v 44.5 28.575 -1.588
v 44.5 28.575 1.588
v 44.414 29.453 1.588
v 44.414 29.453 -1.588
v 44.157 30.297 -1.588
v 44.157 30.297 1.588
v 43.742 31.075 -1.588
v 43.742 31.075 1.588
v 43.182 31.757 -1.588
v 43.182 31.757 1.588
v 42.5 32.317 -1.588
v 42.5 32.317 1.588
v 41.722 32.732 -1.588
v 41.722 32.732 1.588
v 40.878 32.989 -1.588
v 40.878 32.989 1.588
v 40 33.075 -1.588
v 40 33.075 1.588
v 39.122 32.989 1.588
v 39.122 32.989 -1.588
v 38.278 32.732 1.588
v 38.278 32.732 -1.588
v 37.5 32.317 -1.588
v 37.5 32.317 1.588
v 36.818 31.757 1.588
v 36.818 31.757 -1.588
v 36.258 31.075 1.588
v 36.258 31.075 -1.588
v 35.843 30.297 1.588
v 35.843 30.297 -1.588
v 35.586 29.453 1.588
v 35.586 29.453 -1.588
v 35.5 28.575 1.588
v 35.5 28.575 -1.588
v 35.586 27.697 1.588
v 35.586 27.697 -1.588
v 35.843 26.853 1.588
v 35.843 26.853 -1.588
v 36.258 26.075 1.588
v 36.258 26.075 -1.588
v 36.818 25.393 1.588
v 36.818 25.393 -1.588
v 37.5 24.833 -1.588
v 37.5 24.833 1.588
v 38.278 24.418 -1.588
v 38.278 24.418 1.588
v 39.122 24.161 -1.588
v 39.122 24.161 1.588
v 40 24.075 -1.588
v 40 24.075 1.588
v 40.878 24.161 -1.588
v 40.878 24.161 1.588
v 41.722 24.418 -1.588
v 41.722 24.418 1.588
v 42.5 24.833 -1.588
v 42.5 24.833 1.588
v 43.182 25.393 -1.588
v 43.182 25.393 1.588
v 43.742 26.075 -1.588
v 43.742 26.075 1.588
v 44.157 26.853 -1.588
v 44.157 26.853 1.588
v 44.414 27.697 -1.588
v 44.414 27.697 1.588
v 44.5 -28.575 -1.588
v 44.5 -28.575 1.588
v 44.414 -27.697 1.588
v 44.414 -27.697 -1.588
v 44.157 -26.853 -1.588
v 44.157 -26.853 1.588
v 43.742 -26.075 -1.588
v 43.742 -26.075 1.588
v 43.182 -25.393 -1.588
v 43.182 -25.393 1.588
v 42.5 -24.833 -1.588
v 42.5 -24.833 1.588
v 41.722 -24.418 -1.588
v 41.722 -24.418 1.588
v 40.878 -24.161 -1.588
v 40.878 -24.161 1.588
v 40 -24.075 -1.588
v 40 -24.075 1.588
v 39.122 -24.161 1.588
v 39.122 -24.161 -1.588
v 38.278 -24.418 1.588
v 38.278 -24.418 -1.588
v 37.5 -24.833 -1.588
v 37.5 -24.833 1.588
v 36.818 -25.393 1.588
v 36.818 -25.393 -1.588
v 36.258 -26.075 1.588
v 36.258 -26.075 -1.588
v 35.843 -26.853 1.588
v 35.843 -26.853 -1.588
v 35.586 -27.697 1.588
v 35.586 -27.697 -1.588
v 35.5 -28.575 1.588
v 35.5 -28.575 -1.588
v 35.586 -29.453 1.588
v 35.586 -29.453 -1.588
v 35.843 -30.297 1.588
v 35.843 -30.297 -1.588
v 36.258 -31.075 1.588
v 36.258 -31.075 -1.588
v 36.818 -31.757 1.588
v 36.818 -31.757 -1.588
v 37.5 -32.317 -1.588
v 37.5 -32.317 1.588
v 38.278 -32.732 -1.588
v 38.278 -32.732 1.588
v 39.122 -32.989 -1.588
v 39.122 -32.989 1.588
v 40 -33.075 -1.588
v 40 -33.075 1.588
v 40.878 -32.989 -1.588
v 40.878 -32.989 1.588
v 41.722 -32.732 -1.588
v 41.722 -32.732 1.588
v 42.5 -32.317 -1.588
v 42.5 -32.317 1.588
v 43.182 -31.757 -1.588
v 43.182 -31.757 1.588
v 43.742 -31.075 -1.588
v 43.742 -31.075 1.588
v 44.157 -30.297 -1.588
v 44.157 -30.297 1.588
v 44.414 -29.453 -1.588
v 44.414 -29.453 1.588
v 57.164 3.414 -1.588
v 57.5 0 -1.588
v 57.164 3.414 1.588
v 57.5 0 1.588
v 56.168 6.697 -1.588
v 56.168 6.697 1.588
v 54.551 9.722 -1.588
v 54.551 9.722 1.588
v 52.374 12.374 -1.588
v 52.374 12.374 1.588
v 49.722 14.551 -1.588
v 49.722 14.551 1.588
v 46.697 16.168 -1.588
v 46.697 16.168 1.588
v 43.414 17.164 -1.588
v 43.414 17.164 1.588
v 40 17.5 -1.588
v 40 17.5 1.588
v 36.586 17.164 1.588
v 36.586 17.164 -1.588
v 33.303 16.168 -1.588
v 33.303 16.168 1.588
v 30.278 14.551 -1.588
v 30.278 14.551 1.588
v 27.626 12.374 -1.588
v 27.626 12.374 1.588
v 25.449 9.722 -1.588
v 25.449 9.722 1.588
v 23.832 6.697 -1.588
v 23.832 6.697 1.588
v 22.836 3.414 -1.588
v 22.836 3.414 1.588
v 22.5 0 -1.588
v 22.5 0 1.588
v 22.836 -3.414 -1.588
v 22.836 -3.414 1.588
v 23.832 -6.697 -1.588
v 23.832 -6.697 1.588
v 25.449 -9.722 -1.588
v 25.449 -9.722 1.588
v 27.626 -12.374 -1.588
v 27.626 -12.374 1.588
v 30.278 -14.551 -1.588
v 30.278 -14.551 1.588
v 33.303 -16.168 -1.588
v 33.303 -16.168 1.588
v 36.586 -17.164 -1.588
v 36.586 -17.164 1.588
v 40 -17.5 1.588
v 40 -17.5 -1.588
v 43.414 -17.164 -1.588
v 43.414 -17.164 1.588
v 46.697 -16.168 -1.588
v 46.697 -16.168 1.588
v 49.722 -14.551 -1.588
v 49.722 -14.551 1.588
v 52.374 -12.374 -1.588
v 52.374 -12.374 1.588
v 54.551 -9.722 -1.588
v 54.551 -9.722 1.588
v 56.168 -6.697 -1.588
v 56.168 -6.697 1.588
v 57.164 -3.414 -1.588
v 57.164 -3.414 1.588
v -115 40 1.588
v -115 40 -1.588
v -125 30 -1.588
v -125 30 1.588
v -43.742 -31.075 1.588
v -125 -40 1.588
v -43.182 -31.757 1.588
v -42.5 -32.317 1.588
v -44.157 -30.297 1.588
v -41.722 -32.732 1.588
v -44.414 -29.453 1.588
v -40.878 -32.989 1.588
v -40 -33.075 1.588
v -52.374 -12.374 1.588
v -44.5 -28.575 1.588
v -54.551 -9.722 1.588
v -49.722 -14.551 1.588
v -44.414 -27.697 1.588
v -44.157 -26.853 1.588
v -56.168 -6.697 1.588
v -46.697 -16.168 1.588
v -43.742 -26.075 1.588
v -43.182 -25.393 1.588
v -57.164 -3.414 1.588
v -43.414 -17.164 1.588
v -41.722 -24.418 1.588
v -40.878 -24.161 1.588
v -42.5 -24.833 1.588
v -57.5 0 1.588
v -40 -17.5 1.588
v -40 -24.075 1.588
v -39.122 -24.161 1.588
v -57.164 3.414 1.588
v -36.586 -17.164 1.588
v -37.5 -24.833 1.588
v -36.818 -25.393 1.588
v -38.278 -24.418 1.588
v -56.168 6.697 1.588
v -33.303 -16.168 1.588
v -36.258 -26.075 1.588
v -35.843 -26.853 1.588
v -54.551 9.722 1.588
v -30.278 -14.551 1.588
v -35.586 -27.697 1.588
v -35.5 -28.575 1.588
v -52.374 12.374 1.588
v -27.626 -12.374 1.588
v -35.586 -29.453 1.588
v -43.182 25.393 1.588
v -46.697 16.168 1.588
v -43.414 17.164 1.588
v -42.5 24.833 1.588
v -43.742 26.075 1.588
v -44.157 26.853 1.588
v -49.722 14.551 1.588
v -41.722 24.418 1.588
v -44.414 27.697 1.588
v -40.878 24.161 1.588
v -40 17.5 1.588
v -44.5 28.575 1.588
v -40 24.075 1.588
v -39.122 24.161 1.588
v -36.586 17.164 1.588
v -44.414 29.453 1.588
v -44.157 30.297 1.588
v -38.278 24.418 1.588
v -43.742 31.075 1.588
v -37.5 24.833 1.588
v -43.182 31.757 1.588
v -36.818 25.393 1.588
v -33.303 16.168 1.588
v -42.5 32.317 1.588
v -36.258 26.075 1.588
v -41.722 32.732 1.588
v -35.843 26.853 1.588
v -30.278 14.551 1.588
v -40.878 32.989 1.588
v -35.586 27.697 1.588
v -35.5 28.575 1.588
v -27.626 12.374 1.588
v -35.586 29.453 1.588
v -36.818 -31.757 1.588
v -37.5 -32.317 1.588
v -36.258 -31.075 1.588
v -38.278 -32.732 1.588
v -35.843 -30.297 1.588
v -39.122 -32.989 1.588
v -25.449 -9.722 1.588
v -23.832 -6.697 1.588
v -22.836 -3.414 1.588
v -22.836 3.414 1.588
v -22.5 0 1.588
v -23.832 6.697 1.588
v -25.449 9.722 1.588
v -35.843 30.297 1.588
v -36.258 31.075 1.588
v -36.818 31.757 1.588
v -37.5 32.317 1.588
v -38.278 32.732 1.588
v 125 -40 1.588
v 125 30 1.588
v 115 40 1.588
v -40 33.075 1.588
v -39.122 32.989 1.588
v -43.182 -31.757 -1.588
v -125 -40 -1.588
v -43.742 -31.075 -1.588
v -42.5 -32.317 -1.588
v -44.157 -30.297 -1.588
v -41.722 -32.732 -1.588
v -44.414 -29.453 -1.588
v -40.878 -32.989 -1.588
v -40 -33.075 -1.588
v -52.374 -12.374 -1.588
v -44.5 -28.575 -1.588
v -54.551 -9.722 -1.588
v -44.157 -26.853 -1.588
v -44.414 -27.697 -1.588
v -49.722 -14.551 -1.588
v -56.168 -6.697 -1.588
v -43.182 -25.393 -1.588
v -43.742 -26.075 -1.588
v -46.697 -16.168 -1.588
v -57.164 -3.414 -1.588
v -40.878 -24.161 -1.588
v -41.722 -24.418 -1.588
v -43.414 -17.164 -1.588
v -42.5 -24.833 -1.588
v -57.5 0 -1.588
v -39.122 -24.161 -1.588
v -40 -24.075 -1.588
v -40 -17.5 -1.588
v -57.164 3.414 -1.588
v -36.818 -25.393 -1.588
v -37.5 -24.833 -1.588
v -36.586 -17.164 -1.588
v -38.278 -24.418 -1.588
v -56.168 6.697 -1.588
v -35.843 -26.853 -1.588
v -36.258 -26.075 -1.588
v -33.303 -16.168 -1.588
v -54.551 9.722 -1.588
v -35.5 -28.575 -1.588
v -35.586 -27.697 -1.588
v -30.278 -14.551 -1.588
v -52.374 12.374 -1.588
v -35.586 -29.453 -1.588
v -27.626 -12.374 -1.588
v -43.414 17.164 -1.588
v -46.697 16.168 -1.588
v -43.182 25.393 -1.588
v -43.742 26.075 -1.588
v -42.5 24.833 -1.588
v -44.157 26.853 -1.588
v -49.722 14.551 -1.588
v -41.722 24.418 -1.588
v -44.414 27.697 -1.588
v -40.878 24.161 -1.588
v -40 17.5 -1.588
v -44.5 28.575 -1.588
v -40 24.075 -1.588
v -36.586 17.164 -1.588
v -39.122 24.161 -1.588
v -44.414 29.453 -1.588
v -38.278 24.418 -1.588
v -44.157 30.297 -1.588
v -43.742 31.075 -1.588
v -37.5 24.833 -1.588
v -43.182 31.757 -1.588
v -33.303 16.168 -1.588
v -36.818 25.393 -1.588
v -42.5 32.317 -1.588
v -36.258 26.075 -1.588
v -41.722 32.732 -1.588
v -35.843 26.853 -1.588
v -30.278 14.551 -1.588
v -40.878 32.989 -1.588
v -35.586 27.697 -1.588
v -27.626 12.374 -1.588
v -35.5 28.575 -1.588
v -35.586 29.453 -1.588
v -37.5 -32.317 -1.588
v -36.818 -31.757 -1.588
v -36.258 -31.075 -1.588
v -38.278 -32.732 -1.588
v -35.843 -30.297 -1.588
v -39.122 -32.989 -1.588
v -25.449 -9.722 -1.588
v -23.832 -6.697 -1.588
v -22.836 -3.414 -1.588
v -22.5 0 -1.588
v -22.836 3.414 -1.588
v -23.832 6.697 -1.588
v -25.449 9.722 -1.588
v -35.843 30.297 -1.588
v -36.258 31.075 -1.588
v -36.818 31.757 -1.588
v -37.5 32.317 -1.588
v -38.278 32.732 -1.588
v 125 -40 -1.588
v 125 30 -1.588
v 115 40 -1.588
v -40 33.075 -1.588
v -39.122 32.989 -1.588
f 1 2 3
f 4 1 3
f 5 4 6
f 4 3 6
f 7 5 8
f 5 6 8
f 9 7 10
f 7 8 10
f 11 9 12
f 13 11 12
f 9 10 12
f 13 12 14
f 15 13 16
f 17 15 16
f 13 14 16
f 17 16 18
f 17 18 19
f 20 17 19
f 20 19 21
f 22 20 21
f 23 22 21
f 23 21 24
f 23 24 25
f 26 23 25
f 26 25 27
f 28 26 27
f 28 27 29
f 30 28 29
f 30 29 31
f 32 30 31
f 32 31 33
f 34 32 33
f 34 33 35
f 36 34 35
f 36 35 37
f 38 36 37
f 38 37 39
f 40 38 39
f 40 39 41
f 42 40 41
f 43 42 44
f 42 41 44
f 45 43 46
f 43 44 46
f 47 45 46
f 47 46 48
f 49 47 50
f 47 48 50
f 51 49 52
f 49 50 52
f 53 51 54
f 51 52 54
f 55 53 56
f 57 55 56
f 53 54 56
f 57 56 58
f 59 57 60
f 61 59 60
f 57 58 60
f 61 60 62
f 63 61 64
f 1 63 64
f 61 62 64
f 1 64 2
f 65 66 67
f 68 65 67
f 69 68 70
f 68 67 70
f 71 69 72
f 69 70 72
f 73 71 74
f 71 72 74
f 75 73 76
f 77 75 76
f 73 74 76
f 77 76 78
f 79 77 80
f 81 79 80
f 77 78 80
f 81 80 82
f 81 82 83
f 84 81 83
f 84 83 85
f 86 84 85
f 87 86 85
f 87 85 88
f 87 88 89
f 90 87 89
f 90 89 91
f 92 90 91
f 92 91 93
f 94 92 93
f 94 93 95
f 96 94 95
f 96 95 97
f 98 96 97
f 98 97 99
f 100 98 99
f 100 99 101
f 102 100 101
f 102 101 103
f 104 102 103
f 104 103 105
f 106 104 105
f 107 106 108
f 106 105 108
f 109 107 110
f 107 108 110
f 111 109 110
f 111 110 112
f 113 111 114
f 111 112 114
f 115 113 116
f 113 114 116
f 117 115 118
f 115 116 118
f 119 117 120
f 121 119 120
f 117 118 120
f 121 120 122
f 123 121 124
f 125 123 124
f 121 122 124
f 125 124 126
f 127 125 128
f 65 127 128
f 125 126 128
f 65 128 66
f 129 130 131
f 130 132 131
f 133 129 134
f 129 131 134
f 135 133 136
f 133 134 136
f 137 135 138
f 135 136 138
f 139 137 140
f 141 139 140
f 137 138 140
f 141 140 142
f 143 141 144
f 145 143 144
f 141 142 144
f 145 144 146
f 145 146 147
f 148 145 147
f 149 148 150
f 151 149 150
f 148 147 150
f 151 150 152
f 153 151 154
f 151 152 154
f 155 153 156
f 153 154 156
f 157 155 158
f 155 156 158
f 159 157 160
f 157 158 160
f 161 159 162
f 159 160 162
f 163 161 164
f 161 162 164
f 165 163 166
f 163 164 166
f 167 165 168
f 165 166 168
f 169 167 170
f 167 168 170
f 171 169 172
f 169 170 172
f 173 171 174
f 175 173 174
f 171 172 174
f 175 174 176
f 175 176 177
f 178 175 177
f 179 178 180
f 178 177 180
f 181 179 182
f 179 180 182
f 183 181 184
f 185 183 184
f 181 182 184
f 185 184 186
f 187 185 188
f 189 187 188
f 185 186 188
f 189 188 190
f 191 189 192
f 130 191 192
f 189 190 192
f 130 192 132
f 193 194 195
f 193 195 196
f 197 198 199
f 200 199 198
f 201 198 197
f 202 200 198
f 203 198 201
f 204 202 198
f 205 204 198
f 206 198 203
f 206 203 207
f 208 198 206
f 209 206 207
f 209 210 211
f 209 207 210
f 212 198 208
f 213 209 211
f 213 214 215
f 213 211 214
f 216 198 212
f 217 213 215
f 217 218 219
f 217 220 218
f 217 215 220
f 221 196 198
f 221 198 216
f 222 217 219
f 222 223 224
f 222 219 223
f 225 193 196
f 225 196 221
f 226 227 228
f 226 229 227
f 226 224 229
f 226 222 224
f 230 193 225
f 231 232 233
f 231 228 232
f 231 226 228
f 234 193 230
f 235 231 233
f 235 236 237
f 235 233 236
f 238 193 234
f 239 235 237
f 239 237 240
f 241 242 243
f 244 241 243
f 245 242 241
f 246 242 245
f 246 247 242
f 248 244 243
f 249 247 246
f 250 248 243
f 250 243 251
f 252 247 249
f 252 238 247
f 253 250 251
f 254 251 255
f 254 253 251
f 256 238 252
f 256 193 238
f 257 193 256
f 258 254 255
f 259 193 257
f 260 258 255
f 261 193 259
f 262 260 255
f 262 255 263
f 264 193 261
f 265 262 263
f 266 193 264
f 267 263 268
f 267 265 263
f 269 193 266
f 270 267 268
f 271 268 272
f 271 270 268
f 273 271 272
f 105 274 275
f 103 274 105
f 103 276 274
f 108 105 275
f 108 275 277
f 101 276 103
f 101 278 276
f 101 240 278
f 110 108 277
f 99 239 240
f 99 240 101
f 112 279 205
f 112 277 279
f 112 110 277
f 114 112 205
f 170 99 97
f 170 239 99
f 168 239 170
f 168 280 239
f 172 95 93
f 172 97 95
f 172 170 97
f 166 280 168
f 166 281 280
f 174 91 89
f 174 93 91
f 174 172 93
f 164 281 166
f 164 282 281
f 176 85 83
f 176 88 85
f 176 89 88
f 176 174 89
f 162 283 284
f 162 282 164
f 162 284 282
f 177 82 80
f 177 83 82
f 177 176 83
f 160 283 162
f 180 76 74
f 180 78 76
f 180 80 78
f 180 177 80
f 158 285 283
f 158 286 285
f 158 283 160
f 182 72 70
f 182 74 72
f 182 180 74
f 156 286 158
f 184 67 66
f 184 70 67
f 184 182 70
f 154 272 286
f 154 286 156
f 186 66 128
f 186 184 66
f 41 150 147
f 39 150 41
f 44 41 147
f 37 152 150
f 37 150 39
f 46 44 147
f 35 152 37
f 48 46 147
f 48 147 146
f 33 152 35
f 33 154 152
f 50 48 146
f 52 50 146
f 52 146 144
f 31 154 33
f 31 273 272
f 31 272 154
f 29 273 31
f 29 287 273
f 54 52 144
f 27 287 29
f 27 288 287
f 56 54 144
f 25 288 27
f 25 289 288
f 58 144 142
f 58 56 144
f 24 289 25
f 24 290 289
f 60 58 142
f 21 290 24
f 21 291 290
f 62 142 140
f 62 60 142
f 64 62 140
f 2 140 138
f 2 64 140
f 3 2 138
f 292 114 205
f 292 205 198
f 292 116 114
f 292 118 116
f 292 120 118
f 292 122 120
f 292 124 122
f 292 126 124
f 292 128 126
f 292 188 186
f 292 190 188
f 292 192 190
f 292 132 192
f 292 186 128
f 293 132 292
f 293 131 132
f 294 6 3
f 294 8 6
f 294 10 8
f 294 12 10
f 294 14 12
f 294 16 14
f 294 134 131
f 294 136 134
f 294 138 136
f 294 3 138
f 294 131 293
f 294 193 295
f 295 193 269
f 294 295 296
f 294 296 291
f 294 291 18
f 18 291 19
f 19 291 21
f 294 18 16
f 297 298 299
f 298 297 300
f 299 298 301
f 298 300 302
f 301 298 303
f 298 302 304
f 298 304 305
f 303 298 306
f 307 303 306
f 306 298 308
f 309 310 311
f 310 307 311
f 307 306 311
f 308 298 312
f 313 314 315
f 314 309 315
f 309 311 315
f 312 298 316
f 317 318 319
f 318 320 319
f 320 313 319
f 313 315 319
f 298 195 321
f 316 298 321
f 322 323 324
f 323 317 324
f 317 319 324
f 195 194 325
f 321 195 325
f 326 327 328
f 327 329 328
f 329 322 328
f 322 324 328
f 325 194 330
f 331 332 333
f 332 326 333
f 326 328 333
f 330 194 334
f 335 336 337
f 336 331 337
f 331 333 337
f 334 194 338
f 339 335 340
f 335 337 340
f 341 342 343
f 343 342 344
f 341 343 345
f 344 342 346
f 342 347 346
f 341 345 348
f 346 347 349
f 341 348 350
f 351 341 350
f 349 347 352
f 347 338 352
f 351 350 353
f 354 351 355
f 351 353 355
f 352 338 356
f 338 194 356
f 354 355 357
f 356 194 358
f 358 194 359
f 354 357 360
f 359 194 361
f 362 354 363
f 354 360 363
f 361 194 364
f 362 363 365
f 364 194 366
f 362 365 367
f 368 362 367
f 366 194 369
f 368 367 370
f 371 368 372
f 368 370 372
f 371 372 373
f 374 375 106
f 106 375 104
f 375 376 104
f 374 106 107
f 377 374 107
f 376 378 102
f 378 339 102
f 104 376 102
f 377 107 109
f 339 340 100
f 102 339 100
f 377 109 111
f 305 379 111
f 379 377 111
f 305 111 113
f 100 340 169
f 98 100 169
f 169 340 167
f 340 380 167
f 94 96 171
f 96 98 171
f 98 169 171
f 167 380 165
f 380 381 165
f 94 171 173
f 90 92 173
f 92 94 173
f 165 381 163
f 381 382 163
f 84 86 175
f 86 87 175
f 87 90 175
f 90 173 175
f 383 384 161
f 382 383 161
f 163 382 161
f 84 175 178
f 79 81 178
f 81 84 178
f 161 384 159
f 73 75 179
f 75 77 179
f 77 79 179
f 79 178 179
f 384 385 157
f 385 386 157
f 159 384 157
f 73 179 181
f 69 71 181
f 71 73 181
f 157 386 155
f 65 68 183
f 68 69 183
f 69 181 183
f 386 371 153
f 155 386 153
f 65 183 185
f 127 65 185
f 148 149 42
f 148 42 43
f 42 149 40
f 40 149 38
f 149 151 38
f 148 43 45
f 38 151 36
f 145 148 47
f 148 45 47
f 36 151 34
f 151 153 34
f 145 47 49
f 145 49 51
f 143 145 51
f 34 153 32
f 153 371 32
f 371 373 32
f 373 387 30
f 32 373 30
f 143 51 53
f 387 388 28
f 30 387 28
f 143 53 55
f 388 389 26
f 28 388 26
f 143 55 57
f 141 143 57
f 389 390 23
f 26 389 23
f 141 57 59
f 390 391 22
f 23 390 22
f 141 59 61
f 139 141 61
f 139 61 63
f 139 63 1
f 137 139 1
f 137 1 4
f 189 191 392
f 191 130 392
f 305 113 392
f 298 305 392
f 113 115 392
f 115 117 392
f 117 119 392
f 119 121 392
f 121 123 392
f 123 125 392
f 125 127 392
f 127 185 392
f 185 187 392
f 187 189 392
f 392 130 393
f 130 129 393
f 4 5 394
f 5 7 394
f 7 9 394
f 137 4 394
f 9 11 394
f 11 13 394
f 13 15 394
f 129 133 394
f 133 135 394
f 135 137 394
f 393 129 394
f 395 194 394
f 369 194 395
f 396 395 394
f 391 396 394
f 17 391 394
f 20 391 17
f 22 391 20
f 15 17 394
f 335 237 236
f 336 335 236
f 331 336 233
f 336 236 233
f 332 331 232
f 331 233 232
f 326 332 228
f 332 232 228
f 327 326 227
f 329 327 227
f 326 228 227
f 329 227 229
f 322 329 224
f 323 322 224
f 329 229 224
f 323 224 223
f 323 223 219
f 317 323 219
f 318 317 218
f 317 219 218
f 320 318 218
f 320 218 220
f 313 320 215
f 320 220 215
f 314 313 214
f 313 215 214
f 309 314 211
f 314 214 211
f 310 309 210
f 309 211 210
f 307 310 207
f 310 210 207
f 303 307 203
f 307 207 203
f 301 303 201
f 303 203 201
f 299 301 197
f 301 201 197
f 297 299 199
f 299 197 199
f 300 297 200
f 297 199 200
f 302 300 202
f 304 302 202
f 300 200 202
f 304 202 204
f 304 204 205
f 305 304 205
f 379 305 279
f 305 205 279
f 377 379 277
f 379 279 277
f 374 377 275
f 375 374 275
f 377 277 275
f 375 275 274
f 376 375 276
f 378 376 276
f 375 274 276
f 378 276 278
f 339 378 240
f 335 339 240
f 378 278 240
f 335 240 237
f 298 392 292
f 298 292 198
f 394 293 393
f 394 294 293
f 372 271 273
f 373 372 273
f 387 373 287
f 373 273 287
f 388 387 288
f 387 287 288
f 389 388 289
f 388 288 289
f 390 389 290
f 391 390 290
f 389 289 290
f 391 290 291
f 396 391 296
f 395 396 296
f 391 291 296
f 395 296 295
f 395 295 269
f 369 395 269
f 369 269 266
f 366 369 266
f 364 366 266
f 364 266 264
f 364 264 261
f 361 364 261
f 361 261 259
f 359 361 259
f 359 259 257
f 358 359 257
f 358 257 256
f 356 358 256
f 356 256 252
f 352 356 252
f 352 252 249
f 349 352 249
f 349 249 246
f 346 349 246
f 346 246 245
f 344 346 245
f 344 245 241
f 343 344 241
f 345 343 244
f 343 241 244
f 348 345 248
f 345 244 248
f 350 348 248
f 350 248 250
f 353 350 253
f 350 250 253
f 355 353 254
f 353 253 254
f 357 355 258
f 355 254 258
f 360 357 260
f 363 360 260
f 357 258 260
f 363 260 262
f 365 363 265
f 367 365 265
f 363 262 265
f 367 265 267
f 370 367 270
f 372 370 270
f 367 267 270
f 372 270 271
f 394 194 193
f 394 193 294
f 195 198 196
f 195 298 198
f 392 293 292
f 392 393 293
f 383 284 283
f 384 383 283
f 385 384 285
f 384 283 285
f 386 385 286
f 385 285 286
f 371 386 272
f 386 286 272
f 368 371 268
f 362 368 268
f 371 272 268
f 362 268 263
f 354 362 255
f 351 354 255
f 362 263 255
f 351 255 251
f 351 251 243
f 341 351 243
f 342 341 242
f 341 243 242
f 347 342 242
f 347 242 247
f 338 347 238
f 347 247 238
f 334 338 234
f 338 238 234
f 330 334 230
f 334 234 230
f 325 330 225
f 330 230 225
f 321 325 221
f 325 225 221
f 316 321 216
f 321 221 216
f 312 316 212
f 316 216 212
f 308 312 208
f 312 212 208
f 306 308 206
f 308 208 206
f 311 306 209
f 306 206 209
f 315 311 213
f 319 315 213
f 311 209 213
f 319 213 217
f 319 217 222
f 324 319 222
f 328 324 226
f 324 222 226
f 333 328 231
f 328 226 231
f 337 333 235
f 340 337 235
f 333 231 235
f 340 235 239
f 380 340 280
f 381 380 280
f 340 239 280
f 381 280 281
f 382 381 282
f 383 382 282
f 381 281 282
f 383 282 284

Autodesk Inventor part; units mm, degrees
ref_plane "YZ Plane" through (0, 0, 0) normal (1, 0, 0) x (0, 1, 0)
ref_plane "XZ Plane" through (0, 0, 0) normal (0, 1, 0) x (-1, 0, 0)
ref_plane "XY Plane" through (0, 0, 0) normal (0, 0, 1) x (1, 0, 0)
sketch "Sketch1" plane through (0, 0, 0) normal (0, 0, 1) x (1, 0, 0)
  line L0 (125, -40) -> (-125, -40)
  line L1 (-125, -40) -> (-125, 40)
  line L2 (-125, 40) -> (125, 40)
  line L3 (125, 40) -> (125, -40)
  line L4 (0, 56) -> (0, -56) construction
  line L5 (-175, 0) -> (175, 0) construction
  point P0 (0, 0)
  dimension "d0" = 250
  dimension "d1" = 80
extrude "Extrusion1" add sketch "Sketch1" along normal mid plane 3.175
sketch "Sketch2" plane through (0, 0, 1.5875) normal (0, 0, 1) x (1, 0, 0)
  line L0 (0, 56) -> (0, -56) construction
  line L1 (-175, 0) -> (175, 0) construction
  line L2 (-125, -40) -> (125, -40) projected
  circle A0 centre (-40, 0) radius 17.5
  circle A1 centre (40, 0) radius 17.5
  line L3 (-40, -28.575) -> (-40, 28.575) construction
  circle A2 centre (-40, 28.575) radius 4.5
  circle A3 centre (-40, -28.575) radius 4.5
  circle A4 centre (40, -28.575) radius 4.5
  circle A5 centre (40, 28.575) radius 4.5
  point P0 (0, 0)
  dimension "d4" = 40
  dimension "d5" = 80
  dimension "d6" = 35
  dimension "d7" = 57.15
  dimension "d8" = 9
extrude "Extrusion2" cut sketch "Sketch2" against normal up to surface (3.175 mm away)
chamfer "Chamfer1" distance 10 angle 45 2 edges at (125, 40, 0) (-125, 40, 0)
properties part number "Pedalbox_V2_Vert_Rectangle"
